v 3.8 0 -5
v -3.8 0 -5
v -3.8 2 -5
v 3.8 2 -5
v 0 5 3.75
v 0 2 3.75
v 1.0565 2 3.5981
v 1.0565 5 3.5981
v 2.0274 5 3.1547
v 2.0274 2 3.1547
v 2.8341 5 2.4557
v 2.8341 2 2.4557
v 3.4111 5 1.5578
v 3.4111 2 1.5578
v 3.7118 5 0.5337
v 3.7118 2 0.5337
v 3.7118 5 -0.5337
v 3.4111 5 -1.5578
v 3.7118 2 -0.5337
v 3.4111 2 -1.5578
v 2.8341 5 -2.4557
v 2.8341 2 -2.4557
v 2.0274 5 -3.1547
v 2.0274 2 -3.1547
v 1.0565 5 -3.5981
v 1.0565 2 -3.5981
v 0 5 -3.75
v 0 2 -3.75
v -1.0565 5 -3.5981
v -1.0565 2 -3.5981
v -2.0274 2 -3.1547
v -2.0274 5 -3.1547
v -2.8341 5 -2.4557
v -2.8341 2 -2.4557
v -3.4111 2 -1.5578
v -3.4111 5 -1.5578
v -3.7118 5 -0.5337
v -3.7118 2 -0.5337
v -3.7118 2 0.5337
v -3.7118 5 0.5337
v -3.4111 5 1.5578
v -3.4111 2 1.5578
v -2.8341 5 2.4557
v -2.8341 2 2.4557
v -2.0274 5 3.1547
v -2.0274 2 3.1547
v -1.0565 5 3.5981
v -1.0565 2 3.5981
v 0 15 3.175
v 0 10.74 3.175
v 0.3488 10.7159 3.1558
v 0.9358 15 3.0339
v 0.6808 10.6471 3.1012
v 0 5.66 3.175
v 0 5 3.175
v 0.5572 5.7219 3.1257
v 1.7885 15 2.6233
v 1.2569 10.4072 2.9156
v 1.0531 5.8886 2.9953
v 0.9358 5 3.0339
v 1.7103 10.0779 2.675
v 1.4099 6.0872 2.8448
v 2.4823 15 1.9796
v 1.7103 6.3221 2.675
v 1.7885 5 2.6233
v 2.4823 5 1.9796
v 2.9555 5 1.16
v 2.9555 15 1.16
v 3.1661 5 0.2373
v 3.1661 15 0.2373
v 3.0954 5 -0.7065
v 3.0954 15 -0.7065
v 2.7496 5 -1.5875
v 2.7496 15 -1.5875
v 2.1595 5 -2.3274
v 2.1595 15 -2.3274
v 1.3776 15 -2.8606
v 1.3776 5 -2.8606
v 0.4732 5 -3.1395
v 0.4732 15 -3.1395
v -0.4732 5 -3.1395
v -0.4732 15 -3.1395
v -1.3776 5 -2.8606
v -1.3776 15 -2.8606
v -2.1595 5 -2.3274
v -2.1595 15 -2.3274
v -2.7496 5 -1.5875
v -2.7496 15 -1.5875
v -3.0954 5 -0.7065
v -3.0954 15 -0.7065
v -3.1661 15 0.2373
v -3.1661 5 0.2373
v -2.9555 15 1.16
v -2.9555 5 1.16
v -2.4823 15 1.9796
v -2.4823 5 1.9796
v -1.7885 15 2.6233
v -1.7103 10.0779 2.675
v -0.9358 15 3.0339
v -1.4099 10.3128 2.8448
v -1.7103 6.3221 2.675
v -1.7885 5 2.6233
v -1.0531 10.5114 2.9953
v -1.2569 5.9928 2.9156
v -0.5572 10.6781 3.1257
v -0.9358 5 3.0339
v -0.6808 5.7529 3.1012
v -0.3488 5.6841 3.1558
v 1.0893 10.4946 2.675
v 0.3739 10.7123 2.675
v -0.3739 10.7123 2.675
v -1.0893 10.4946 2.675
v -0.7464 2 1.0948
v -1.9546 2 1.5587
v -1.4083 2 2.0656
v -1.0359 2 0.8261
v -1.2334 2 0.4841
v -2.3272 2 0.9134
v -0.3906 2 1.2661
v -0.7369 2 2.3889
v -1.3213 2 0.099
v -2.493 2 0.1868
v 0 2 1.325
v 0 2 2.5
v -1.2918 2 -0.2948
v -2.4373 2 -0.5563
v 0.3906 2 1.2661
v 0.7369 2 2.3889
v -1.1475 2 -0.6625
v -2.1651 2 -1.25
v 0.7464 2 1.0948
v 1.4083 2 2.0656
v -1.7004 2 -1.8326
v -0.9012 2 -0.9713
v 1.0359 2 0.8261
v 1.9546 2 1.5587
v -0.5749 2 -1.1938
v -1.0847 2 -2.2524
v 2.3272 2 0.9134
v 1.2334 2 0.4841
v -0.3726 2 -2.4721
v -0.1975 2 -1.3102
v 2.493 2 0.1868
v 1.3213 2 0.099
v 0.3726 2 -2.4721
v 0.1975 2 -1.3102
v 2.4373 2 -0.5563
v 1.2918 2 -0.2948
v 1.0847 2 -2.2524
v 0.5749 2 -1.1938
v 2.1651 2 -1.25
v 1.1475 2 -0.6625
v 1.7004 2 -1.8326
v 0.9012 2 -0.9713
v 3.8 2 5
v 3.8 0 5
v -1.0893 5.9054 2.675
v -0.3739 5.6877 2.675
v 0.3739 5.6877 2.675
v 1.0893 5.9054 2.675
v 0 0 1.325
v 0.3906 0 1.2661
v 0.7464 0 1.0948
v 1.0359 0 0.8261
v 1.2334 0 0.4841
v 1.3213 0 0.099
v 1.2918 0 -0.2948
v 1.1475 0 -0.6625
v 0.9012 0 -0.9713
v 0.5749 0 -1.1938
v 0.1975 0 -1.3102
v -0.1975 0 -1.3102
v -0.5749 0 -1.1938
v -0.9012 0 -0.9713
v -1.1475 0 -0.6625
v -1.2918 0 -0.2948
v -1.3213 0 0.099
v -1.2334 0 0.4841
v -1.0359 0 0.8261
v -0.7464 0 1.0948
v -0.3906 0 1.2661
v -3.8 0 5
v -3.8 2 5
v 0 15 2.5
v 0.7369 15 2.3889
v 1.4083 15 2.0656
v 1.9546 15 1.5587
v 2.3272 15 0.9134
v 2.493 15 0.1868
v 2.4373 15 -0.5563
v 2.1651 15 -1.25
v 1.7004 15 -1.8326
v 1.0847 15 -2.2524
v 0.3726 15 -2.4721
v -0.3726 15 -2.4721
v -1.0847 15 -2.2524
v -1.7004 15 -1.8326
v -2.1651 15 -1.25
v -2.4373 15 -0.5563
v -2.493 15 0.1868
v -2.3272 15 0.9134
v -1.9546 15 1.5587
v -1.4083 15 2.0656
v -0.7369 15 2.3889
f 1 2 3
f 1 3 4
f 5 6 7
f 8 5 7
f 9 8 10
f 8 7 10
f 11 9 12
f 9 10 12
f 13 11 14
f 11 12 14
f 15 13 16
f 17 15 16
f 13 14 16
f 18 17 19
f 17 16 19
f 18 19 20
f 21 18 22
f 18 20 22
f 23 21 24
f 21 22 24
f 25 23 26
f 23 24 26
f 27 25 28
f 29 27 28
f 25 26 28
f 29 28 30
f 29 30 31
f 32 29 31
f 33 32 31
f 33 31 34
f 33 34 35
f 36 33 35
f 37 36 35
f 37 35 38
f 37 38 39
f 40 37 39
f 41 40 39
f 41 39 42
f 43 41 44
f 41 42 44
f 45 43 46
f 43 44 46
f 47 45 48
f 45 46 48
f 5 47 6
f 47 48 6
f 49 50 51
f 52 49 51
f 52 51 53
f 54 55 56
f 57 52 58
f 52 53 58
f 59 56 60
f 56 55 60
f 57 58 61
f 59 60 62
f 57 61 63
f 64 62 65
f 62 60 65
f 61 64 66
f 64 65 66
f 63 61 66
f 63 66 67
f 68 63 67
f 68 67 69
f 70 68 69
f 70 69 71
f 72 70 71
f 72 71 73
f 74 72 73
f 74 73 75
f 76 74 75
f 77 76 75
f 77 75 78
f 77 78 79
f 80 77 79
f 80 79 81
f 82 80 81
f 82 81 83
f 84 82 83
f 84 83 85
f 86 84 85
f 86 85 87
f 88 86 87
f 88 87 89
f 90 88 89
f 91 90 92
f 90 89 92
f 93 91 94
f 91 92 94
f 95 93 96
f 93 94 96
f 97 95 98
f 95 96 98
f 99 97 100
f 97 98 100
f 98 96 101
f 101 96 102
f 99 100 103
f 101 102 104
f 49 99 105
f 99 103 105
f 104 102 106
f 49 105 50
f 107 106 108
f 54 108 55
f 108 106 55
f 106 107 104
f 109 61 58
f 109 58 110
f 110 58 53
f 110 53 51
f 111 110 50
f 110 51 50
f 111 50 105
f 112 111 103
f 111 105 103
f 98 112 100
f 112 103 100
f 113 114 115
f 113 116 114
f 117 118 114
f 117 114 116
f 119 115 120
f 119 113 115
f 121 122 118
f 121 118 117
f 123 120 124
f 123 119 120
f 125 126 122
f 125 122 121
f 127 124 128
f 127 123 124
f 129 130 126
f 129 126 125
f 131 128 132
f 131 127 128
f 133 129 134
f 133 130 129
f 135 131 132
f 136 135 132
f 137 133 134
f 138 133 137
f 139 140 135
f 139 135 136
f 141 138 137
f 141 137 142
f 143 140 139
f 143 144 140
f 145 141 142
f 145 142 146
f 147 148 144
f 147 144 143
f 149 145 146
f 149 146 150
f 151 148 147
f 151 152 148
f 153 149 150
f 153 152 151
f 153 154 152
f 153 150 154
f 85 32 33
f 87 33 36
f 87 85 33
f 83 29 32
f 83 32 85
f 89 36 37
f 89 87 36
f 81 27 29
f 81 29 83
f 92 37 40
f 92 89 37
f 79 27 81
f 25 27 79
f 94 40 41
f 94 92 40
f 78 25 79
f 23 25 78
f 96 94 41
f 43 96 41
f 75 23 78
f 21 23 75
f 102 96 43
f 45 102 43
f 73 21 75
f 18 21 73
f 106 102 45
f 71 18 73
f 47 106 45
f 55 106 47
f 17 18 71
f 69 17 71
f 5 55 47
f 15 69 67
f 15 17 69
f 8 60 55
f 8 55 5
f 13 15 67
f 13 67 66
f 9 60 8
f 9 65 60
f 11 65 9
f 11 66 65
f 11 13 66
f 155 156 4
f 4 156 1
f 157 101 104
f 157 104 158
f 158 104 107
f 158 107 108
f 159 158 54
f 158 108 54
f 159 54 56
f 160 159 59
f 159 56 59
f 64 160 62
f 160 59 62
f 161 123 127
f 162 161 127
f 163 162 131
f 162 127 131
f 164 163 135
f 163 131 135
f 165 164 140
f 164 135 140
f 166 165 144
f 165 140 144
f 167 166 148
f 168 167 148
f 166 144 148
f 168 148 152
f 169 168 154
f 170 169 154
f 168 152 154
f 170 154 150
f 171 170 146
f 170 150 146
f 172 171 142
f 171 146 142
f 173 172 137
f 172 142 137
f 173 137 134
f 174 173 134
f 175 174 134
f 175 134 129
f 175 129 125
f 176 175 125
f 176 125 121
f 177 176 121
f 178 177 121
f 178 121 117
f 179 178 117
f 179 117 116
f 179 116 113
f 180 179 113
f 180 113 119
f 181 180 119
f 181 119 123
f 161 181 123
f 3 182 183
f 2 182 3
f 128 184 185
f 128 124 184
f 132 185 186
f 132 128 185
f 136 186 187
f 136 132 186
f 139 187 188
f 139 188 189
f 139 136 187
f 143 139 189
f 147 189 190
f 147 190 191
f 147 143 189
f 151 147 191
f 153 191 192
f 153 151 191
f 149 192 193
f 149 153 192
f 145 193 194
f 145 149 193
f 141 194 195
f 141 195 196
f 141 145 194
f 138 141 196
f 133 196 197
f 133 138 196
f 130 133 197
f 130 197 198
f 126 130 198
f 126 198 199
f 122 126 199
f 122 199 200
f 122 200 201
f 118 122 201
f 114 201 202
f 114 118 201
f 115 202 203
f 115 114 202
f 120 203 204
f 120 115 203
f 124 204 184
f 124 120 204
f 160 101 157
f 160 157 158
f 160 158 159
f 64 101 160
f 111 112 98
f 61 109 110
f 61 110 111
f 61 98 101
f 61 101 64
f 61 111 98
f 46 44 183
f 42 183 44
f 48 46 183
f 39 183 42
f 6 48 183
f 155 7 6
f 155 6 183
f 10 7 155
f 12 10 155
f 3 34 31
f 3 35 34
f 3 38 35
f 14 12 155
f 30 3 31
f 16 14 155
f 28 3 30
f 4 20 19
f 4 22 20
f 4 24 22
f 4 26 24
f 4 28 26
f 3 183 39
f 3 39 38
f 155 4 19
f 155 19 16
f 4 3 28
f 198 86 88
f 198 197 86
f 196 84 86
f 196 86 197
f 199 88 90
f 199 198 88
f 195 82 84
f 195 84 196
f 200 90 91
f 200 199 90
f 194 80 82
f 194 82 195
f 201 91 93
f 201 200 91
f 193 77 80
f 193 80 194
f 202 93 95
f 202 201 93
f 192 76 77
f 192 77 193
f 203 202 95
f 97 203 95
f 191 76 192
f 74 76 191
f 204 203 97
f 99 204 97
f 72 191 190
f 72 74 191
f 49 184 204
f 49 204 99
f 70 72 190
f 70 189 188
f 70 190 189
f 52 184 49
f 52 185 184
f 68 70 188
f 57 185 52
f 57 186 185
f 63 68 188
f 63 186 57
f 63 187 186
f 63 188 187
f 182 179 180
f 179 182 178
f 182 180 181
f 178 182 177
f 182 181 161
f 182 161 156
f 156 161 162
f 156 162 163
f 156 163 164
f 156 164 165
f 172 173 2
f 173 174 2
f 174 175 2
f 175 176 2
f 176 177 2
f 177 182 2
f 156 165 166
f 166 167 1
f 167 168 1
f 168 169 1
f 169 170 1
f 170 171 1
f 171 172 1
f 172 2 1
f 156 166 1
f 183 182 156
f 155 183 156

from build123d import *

# Parameters (mm, degrees)
ESQUISSE1_W             = 7.6
ESQUISSE1_H             = 10
BOSS_EXTRU_1_DEPTH      = 2
ESQUISSE2_R             = 3.75
ESQUISSE2_R_2           = 2.5
BOSS_EXTRU_2_DEPTH      = 3
ESQUISSE3_R             = 3.175
ESQUISSE3_R_2           = 2.5
BOSS_EXTRU_3_DEPTH      = 10
ESQUISSE4_R             = 1.325
ENL_V_MAT_EXTRU_1_DEPTH = 15.437451299
ESQUISSE6_R             = 2.54
ENL_V_MAT_EXTRU_3_DEPTH = 0.5


with BuildPart() as part:
    # Esquisse1 → Boss.-Extru.1 (new body)
    with BuildSketch(Plane(origin=(0, 0, 0), x_dir=(1, 0, 0), z_dir=(0, 1, 0))):
        Rectangle(ESQUISSE1_W, ESQUISSE1_H)
    extrude(amount=BOSS_EXTRU_1_DEPTH)

    # Esquisse2 → Boss.-Extru.2 (add)
    with BuildSketch(Plane(origin=(0, 2, 0), x_dir=(1, 0, 0), z_dir=(0, 1, 0))):
        with Locations(Location((0, 0, 0), (0, 0, 270))):
            Circle(ESQUISSE2_R)
        with Locations(Location((0, 0, 0), (0, 0, 270))):
            Circle(ESQUISSE2_R_2, mode=Mode.SUBTRACT)
    extrude(amount=BOSS_EXTRU_2_DEPTH)

    # Esquisse3 → Boss.-Extru.3 (add)
    with BuildSketch(Plane(origin=(0, 5, 0), x_dir=(1, 0, 0), z_dir=(0, 1, 0))):
        with Locations(Location((0, 0, 0), (0, 0, 270))):
            Circle(ESQUISSE3_R)
        with Locations(Location((0, 0, 0), (0, 0, 270))):
            Circle(ESQUISSE3_R_2, mode=Mode.SUBTRACT)
    extrude(amount=BOSS_EXTRU_3_DEPTH)

    # Esquisse4 → Enlèv. mat.-Extru.1 (cut, through all)
    with BuildSketch(Plane(origin=(0, 2, 0), x_dir=(1, 0, 0), z_dir=(0, 1, 0))):
        with Locations(Location((0, 0, 0), (0, 0, 270))):
            Circle(ESQUISSE4_R)
    extrude(amount=-ENL_V_MAT_EXTRU_1_DEPTH, mode=Mode.SUBTRACT)

    # Esquisse6 → Enlèv. mat.-Extru.3 (cut)
    with BuildSketch(Plane.XY.offset(3.175)):
        with Locations((0, 8.2)):
            Circle(ESQUISSE6_R)
    extrude(amount=-ENL_V_MAT_EXTRU_3_DEPTH, mode=Mode.SUBTRACT)


solid = part.part
